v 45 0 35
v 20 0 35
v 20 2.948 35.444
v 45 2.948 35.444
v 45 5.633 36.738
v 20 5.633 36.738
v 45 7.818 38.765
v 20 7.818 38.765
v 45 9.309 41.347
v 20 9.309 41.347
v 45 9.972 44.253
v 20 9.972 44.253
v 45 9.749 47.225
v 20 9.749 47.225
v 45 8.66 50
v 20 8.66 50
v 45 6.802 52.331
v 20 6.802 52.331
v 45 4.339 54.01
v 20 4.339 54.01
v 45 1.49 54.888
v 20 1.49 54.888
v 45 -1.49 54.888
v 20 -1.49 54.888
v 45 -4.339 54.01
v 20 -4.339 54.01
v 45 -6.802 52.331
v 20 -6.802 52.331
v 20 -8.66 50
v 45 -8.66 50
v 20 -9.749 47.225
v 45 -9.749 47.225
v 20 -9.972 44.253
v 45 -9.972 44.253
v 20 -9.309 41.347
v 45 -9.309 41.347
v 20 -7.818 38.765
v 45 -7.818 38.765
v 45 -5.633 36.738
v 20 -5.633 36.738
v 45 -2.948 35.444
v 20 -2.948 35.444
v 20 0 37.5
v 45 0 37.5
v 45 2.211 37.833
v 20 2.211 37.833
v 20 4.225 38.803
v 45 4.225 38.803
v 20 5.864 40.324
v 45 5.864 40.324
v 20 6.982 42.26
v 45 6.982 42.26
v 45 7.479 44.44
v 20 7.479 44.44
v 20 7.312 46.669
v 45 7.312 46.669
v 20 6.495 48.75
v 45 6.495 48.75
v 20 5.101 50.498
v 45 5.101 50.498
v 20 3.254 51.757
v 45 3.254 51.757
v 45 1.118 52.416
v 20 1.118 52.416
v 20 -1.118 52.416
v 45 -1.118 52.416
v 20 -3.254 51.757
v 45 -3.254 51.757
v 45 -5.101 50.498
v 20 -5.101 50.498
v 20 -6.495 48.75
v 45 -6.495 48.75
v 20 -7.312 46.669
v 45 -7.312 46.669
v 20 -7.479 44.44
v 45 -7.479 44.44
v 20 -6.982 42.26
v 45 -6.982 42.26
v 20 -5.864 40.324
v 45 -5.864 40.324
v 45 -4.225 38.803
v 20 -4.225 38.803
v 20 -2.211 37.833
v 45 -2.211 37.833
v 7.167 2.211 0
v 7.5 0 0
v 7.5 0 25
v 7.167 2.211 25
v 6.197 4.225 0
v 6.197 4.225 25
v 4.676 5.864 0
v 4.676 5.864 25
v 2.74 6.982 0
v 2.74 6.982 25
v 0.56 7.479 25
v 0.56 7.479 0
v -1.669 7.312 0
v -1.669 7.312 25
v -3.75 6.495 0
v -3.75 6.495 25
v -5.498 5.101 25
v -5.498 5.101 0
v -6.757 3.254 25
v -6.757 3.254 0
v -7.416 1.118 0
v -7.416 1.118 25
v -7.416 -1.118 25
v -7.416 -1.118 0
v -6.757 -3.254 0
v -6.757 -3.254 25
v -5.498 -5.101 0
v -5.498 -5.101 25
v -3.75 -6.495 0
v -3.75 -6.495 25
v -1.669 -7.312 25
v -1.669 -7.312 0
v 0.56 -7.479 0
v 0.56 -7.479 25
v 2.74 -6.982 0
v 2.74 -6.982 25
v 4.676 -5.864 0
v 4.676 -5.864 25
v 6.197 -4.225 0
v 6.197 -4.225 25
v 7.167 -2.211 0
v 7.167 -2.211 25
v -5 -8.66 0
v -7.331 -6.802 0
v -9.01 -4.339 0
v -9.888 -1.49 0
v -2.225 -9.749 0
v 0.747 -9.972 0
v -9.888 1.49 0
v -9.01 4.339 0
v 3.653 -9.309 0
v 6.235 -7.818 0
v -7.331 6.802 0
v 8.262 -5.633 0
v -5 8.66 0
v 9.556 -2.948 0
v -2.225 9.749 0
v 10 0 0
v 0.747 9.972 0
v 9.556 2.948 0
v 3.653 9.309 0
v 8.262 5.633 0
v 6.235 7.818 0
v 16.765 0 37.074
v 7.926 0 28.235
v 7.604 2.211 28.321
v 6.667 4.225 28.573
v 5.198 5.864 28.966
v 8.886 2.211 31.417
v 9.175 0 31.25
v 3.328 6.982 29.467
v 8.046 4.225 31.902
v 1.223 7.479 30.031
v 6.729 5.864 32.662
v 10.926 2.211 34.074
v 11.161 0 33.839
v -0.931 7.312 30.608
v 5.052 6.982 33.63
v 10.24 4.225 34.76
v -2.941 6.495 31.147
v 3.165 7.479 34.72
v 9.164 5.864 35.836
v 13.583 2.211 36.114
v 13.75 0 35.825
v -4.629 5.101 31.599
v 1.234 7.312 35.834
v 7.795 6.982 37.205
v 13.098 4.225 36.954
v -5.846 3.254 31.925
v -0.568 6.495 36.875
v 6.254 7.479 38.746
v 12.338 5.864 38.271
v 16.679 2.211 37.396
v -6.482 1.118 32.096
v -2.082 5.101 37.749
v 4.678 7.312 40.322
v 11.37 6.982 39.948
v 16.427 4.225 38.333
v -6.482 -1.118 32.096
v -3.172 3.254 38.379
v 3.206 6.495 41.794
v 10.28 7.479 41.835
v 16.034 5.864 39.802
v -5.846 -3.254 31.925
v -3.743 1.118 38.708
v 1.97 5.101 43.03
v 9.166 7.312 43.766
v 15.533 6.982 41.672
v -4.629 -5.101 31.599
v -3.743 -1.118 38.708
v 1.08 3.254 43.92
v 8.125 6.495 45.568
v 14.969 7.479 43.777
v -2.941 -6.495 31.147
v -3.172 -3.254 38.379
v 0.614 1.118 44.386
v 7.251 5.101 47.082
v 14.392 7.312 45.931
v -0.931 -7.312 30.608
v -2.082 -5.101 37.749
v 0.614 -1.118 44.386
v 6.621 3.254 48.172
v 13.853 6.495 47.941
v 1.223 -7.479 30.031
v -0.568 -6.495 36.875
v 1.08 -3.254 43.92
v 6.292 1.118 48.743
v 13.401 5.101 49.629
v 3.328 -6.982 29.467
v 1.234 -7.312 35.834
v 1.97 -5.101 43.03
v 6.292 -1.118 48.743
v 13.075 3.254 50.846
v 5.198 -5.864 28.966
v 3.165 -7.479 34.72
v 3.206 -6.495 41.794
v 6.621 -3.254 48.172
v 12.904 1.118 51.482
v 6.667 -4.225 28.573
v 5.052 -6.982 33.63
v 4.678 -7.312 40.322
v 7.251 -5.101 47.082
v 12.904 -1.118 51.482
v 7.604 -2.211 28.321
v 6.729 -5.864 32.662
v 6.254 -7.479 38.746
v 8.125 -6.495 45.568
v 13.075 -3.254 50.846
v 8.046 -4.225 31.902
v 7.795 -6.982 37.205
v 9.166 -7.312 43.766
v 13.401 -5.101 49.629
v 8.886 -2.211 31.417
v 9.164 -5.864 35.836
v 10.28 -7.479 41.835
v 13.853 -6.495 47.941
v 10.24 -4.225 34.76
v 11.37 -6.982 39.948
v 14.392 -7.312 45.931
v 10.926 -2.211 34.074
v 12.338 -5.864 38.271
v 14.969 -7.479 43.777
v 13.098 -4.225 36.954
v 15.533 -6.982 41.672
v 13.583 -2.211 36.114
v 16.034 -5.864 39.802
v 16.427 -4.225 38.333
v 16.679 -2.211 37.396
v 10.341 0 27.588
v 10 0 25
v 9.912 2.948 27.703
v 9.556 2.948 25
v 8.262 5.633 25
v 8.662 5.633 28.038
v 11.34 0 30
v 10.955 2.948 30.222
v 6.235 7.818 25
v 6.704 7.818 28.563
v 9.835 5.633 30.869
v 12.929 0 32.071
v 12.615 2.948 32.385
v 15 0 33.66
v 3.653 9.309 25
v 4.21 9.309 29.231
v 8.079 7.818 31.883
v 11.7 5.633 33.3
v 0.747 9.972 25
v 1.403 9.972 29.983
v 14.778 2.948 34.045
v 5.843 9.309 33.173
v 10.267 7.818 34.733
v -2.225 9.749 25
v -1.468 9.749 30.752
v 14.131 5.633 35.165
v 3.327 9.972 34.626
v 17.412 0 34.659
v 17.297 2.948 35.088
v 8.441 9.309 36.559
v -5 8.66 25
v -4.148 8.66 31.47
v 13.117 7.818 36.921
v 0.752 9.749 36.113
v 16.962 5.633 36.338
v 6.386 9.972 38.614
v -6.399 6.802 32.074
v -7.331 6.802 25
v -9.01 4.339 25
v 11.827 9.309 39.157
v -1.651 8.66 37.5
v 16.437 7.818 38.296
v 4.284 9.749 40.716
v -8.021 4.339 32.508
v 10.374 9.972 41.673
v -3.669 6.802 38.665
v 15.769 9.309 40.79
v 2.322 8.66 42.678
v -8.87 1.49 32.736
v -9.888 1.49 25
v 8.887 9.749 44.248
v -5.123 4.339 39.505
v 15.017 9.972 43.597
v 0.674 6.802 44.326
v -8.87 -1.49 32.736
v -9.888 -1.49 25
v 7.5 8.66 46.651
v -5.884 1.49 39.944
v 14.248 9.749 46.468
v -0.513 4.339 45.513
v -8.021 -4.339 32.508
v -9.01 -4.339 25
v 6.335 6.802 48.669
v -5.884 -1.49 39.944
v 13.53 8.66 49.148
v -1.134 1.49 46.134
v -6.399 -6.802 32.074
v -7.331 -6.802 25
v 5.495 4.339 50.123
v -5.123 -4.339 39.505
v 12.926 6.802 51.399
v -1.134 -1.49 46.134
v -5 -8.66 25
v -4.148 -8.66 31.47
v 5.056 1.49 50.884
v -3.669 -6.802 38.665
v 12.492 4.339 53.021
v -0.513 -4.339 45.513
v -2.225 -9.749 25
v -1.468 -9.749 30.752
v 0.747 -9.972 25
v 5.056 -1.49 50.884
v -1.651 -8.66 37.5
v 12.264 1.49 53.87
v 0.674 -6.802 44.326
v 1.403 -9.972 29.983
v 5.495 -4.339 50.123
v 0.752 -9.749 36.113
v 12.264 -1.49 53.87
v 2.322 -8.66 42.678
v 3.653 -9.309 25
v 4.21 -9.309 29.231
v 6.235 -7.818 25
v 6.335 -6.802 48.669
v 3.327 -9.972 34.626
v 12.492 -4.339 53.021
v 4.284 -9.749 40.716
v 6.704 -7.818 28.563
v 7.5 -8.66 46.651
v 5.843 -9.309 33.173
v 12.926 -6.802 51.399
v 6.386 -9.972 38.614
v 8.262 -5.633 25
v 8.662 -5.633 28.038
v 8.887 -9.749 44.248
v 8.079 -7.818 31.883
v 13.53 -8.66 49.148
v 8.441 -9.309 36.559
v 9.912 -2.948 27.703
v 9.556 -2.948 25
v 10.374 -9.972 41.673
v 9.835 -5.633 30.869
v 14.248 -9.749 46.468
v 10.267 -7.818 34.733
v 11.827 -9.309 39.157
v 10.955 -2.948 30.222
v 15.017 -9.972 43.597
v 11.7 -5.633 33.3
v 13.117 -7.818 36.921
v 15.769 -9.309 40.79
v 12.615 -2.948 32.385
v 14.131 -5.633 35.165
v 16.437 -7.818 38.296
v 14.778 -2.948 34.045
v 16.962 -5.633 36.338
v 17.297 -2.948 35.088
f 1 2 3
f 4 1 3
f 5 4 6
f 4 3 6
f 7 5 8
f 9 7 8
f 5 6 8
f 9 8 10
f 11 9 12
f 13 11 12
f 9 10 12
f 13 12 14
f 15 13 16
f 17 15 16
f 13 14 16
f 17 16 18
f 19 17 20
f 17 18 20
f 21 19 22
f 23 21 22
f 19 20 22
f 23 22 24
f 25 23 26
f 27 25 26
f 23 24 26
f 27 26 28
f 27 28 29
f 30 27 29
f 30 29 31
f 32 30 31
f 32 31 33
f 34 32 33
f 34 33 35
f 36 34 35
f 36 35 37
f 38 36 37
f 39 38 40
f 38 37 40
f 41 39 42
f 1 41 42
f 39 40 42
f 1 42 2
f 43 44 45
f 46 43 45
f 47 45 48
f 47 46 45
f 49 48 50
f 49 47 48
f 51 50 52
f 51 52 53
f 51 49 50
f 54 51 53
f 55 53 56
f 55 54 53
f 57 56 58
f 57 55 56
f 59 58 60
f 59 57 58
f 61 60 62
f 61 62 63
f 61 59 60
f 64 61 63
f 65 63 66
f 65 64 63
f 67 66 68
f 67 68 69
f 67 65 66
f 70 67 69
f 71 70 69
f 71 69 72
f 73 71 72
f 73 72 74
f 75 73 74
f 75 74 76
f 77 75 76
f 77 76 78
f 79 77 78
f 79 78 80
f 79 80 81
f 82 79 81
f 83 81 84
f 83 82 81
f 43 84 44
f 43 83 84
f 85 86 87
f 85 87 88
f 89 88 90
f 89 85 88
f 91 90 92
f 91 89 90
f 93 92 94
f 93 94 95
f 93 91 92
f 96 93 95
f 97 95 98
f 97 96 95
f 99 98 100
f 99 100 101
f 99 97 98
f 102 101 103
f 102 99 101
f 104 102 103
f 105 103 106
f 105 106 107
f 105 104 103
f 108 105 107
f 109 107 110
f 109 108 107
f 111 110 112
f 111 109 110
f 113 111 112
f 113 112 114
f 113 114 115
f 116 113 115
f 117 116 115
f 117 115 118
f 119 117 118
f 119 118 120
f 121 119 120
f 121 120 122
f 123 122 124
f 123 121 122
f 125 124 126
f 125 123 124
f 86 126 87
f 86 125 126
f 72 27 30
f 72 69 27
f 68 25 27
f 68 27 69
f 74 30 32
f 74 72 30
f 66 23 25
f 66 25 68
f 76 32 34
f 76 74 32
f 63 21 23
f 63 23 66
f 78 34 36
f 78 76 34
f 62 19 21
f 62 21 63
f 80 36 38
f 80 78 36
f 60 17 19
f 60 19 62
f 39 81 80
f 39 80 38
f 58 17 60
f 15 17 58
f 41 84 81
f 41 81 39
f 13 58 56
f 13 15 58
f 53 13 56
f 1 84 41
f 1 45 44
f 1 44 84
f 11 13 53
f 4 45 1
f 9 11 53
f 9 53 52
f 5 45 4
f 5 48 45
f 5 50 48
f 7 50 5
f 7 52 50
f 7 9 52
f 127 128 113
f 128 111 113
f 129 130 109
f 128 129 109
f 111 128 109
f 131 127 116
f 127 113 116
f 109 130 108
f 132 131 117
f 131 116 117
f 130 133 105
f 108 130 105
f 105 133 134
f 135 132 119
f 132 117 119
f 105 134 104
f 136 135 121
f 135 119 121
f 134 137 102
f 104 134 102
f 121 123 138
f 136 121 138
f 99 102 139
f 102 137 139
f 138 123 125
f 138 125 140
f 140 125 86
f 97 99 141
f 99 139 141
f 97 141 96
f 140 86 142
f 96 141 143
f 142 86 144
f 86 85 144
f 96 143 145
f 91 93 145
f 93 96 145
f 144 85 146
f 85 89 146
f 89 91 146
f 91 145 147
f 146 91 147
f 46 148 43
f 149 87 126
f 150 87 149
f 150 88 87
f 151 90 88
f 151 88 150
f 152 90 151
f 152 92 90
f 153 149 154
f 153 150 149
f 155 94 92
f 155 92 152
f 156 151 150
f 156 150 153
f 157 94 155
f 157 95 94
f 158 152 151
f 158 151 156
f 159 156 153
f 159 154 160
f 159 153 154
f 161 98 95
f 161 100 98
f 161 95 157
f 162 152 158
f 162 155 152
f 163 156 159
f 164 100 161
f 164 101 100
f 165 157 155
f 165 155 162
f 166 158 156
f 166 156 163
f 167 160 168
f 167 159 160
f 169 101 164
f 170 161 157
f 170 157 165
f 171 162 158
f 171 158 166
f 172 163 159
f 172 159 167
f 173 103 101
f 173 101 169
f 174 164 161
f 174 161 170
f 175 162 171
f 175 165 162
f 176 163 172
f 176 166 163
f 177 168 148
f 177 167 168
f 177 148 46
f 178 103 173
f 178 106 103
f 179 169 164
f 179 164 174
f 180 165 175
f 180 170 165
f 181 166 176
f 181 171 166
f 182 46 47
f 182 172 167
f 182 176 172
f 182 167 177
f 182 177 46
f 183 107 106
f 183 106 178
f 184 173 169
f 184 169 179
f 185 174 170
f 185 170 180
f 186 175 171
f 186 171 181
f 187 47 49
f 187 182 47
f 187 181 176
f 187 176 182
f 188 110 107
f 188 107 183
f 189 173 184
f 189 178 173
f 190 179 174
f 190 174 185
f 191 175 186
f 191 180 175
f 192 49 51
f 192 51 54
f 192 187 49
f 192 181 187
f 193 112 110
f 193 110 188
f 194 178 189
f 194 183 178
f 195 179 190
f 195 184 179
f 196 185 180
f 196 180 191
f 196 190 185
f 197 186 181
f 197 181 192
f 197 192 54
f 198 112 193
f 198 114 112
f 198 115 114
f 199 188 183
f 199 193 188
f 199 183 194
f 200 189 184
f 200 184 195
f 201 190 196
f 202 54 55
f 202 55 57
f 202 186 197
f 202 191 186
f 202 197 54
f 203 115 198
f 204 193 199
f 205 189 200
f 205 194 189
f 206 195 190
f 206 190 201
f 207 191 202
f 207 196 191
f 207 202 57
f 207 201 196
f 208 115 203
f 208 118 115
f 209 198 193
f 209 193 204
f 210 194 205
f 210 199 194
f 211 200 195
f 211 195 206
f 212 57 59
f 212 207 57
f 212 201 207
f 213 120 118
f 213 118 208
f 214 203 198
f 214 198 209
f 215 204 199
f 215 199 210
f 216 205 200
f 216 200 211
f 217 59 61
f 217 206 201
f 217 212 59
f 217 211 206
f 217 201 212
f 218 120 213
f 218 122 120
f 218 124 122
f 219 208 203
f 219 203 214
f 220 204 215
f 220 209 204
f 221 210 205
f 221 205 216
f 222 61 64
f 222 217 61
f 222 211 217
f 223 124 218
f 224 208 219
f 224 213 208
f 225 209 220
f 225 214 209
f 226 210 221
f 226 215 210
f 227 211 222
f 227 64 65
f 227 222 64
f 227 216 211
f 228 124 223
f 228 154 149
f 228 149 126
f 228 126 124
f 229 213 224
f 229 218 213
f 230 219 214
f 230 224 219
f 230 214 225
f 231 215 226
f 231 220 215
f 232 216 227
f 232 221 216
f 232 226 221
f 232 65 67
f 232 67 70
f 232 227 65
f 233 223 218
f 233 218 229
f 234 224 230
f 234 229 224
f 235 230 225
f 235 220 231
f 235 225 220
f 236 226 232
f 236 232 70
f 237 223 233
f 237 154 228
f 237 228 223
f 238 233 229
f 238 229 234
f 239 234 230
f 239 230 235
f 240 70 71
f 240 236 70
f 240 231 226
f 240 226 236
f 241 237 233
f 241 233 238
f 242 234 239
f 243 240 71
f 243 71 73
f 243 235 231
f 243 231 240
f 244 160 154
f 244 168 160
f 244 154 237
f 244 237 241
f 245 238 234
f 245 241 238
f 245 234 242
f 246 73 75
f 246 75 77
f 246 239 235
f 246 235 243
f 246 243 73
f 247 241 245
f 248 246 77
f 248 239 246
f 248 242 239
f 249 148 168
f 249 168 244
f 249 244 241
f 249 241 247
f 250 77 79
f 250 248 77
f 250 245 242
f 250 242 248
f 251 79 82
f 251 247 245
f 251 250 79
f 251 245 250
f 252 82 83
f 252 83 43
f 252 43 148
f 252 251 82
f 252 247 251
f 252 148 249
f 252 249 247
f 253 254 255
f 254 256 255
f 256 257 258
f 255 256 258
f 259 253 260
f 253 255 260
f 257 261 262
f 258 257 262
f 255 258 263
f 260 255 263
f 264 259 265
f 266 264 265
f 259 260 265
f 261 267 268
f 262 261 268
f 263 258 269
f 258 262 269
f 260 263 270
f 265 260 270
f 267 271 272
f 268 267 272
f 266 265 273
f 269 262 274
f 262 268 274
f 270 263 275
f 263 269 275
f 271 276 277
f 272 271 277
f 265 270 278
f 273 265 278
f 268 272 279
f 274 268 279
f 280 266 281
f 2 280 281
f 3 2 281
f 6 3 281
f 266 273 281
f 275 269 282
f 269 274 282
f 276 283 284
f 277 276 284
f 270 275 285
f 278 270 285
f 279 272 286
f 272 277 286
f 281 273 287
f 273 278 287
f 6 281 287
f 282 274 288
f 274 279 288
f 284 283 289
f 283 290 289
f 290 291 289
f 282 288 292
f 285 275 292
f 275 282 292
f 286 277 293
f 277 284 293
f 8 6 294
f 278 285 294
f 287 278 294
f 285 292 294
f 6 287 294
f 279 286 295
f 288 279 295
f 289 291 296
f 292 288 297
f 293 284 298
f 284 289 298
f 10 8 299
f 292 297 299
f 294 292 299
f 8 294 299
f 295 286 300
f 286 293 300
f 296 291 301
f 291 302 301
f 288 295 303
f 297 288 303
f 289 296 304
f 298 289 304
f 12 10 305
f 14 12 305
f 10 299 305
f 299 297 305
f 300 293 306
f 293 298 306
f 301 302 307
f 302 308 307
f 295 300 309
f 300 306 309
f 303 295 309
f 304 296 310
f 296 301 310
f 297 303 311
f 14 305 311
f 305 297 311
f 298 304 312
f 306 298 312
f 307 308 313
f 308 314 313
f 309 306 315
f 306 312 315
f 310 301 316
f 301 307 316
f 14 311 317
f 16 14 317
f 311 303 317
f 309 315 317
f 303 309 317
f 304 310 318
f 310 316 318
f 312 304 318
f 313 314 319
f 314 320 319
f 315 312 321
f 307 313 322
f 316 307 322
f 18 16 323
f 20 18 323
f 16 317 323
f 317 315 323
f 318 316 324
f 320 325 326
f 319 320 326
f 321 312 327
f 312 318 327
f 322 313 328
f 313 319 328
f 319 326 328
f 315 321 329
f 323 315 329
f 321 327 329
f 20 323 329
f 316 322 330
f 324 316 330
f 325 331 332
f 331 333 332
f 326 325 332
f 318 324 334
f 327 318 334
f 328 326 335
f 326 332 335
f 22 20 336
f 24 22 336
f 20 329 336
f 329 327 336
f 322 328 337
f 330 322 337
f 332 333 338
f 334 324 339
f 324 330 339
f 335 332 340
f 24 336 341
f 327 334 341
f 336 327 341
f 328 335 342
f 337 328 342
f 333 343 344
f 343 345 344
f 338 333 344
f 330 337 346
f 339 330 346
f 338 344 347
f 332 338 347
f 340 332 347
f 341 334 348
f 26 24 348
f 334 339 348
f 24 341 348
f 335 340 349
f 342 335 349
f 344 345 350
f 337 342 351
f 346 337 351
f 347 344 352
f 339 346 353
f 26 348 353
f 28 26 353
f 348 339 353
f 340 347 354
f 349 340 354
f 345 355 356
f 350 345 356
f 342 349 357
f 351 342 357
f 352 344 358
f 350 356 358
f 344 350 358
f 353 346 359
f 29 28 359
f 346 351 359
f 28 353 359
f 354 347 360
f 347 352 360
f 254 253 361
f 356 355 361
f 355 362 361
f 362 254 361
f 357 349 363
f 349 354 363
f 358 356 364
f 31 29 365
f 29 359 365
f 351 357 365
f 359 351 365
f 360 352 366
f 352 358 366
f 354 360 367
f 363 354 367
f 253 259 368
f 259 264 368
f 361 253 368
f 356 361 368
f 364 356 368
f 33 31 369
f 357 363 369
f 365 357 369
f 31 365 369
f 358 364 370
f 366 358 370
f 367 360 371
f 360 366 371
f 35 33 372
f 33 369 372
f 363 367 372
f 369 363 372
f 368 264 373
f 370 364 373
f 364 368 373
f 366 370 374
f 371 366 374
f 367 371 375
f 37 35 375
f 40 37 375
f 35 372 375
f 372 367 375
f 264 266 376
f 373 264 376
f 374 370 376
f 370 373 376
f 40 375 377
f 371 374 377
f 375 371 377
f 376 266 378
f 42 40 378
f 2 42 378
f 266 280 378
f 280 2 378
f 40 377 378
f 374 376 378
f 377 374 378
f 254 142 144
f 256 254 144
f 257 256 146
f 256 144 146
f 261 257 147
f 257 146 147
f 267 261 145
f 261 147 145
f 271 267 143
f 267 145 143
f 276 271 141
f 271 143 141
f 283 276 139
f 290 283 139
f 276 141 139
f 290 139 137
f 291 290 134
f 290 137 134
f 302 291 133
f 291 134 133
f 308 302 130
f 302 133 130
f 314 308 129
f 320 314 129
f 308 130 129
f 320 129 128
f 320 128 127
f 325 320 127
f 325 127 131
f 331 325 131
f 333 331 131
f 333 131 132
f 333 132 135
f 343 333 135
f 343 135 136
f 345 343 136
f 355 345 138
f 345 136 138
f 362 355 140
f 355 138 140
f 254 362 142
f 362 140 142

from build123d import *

# Parameters (mm, degrees)
F0_R     = 10
F0_R_2   = 7.5
F1_DEPTH = 25
F3_R     = 10
F3_R_2   = 7.5
F4_ANGLE = 90
F5_DEPTH = 25


with BuildPart() as f1:
    # F0 (on Top) → F1 (new body)
    with BuildSketch(Plane.XY):
        Circle(F0_R)
        Circle(F0_R_2, mode=Mode.SUBTRACT)
    extrude(amount=F1_DEPTH)

    # F3 (on face) → F4 (revolve)
    with BuildSketch(Plane.XY.offset(25)):
        Circle(F3_R)
        Circle(F3_R_2, mode=Mode.SUBTRACT)
    revolve(axis=Axis((20, 0.0099948445, 25), (0, 1, 0)), revolution_arc=F4_ANGLE)

    # F5 (add): a face of the model
    f5_faces = [f1.faces().sort_by_distance(p)[0] for p in [
        (20, 0, 54.7171572875),
    ]]
    extrude(f5_faces, amount=F5_DEPTH)


solid = f1.part
